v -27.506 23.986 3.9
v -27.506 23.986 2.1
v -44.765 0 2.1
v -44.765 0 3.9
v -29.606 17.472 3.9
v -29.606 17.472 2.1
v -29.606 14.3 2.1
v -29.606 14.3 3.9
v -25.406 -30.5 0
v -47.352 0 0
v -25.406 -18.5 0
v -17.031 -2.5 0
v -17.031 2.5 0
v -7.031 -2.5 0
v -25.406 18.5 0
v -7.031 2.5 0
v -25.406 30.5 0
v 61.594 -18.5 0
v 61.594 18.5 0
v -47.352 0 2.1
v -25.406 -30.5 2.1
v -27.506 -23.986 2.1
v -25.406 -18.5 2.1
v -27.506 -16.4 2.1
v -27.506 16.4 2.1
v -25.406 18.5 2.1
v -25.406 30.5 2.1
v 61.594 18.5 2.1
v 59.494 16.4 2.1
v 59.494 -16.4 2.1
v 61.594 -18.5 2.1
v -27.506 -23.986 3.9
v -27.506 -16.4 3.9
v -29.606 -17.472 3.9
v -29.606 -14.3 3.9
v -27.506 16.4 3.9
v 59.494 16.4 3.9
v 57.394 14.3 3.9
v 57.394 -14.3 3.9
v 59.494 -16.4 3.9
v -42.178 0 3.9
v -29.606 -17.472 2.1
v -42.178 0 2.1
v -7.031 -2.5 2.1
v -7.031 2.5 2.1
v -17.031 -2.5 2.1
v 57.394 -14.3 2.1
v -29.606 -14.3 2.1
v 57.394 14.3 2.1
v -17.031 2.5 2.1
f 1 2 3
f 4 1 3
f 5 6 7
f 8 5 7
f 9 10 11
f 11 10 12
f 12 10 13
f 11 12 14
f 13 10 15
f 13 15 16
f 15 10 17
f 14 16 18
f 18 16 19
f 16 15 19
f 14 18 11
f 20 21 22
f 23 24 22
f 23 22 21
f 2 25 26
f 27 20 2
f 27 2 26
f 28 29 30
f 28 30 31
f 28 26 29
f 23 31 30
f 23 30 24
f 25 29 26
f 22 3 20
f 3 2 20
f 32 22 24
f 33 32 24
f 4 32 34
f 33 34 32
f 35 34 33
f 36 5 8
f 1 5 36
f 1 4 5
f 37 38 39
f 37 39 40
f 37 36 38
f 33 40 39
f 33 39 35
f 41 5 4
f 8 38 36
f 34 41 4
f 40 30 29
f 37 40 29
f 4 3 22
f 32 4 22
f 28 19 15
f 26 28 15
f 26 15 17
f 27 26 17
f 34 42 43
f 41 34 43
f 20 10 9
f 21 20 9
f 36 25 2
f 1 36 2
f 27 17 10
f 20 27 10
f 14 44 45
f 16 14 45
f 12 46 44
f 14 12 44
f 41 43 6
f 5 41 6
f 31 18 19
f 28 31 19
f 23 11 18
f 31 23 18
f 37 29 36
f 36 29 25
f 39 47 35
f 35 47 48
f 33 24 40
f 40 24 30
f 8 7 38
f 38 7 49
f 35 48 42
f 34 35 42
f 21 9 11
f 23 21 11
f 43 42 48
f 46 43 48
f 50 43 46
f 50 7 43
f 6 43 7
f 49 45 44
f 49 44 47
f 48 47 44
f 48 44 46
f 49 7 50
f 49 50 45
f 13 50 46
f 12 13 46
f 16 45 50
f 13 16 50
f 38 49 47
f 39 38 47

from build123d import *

# Parameters (mm, degrees)
F1_DEPTH = 2.1
F3_DEPTH = 1.8
F5_DEPTH = 8


with BuildPart() as f1:
    # F0 (on Top) → F1 (new body)
    with BuildSketch(Plane.XY):
        Polygon((61.593626, -18.5), (61.593626, 18.5), (-25.406374, 18.5), (-25.406374, 30.5), (-47.352125, 0), (-25.406374, -30.5), (-25.406374, -18.5), align=None)
    extrude(amount=F1_DEPTH)

    # F2 (on face) → F3 (join)
    with BuildSketch(Plane.XY.offset(2.1)):
        Polygon((59.493628, 16.400002), (-27.506373, 16.400002), (-27.506373, 23.985889), (-44.765007, 0), (-27.506373, -23.985889), (-27.506373, -16.400002), (59.493628, -16.400002), align=None)
        Polygon((-29.606375, 17.471772), (-29.606375, 14.3), (57.393626, 14.3), (57.393626, -14.3), (-29.606375, -14.3), (-29.606375, -17.471772), (-42.177888, 0), align=None, mode=Mode.SUBTRACT)
    extrude(amount=F3_DEPTH)

    # F4 (on face) → F5 (cut)
    with BuildSketch(Plane.XY.offset(2.1)):
        Polygon((-7.031372, -2.5), (-7.031372, 0), (-7.031372, 2.5), (-17.031372, 2.5), (-17.031372, -2.5), align=None)
    extrude(amount=-F5_DEPTH, mode=Mode.SUBTRACT)


solid = f1.part
